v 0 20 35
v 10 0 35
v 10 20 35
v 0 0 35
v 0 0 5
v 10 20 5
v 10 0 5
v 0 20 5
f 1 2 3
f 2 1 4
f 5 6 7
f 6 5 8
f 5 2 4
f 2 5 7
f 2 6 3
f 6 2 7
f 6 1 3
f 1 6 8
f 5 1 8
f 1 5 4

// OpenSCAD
// Generated by scadwright. Do not hand-edit —
// edit the Python source and regenerate.

translate([0, 0, 5]) {
    cube([10, 20, 30], center=false);
}
